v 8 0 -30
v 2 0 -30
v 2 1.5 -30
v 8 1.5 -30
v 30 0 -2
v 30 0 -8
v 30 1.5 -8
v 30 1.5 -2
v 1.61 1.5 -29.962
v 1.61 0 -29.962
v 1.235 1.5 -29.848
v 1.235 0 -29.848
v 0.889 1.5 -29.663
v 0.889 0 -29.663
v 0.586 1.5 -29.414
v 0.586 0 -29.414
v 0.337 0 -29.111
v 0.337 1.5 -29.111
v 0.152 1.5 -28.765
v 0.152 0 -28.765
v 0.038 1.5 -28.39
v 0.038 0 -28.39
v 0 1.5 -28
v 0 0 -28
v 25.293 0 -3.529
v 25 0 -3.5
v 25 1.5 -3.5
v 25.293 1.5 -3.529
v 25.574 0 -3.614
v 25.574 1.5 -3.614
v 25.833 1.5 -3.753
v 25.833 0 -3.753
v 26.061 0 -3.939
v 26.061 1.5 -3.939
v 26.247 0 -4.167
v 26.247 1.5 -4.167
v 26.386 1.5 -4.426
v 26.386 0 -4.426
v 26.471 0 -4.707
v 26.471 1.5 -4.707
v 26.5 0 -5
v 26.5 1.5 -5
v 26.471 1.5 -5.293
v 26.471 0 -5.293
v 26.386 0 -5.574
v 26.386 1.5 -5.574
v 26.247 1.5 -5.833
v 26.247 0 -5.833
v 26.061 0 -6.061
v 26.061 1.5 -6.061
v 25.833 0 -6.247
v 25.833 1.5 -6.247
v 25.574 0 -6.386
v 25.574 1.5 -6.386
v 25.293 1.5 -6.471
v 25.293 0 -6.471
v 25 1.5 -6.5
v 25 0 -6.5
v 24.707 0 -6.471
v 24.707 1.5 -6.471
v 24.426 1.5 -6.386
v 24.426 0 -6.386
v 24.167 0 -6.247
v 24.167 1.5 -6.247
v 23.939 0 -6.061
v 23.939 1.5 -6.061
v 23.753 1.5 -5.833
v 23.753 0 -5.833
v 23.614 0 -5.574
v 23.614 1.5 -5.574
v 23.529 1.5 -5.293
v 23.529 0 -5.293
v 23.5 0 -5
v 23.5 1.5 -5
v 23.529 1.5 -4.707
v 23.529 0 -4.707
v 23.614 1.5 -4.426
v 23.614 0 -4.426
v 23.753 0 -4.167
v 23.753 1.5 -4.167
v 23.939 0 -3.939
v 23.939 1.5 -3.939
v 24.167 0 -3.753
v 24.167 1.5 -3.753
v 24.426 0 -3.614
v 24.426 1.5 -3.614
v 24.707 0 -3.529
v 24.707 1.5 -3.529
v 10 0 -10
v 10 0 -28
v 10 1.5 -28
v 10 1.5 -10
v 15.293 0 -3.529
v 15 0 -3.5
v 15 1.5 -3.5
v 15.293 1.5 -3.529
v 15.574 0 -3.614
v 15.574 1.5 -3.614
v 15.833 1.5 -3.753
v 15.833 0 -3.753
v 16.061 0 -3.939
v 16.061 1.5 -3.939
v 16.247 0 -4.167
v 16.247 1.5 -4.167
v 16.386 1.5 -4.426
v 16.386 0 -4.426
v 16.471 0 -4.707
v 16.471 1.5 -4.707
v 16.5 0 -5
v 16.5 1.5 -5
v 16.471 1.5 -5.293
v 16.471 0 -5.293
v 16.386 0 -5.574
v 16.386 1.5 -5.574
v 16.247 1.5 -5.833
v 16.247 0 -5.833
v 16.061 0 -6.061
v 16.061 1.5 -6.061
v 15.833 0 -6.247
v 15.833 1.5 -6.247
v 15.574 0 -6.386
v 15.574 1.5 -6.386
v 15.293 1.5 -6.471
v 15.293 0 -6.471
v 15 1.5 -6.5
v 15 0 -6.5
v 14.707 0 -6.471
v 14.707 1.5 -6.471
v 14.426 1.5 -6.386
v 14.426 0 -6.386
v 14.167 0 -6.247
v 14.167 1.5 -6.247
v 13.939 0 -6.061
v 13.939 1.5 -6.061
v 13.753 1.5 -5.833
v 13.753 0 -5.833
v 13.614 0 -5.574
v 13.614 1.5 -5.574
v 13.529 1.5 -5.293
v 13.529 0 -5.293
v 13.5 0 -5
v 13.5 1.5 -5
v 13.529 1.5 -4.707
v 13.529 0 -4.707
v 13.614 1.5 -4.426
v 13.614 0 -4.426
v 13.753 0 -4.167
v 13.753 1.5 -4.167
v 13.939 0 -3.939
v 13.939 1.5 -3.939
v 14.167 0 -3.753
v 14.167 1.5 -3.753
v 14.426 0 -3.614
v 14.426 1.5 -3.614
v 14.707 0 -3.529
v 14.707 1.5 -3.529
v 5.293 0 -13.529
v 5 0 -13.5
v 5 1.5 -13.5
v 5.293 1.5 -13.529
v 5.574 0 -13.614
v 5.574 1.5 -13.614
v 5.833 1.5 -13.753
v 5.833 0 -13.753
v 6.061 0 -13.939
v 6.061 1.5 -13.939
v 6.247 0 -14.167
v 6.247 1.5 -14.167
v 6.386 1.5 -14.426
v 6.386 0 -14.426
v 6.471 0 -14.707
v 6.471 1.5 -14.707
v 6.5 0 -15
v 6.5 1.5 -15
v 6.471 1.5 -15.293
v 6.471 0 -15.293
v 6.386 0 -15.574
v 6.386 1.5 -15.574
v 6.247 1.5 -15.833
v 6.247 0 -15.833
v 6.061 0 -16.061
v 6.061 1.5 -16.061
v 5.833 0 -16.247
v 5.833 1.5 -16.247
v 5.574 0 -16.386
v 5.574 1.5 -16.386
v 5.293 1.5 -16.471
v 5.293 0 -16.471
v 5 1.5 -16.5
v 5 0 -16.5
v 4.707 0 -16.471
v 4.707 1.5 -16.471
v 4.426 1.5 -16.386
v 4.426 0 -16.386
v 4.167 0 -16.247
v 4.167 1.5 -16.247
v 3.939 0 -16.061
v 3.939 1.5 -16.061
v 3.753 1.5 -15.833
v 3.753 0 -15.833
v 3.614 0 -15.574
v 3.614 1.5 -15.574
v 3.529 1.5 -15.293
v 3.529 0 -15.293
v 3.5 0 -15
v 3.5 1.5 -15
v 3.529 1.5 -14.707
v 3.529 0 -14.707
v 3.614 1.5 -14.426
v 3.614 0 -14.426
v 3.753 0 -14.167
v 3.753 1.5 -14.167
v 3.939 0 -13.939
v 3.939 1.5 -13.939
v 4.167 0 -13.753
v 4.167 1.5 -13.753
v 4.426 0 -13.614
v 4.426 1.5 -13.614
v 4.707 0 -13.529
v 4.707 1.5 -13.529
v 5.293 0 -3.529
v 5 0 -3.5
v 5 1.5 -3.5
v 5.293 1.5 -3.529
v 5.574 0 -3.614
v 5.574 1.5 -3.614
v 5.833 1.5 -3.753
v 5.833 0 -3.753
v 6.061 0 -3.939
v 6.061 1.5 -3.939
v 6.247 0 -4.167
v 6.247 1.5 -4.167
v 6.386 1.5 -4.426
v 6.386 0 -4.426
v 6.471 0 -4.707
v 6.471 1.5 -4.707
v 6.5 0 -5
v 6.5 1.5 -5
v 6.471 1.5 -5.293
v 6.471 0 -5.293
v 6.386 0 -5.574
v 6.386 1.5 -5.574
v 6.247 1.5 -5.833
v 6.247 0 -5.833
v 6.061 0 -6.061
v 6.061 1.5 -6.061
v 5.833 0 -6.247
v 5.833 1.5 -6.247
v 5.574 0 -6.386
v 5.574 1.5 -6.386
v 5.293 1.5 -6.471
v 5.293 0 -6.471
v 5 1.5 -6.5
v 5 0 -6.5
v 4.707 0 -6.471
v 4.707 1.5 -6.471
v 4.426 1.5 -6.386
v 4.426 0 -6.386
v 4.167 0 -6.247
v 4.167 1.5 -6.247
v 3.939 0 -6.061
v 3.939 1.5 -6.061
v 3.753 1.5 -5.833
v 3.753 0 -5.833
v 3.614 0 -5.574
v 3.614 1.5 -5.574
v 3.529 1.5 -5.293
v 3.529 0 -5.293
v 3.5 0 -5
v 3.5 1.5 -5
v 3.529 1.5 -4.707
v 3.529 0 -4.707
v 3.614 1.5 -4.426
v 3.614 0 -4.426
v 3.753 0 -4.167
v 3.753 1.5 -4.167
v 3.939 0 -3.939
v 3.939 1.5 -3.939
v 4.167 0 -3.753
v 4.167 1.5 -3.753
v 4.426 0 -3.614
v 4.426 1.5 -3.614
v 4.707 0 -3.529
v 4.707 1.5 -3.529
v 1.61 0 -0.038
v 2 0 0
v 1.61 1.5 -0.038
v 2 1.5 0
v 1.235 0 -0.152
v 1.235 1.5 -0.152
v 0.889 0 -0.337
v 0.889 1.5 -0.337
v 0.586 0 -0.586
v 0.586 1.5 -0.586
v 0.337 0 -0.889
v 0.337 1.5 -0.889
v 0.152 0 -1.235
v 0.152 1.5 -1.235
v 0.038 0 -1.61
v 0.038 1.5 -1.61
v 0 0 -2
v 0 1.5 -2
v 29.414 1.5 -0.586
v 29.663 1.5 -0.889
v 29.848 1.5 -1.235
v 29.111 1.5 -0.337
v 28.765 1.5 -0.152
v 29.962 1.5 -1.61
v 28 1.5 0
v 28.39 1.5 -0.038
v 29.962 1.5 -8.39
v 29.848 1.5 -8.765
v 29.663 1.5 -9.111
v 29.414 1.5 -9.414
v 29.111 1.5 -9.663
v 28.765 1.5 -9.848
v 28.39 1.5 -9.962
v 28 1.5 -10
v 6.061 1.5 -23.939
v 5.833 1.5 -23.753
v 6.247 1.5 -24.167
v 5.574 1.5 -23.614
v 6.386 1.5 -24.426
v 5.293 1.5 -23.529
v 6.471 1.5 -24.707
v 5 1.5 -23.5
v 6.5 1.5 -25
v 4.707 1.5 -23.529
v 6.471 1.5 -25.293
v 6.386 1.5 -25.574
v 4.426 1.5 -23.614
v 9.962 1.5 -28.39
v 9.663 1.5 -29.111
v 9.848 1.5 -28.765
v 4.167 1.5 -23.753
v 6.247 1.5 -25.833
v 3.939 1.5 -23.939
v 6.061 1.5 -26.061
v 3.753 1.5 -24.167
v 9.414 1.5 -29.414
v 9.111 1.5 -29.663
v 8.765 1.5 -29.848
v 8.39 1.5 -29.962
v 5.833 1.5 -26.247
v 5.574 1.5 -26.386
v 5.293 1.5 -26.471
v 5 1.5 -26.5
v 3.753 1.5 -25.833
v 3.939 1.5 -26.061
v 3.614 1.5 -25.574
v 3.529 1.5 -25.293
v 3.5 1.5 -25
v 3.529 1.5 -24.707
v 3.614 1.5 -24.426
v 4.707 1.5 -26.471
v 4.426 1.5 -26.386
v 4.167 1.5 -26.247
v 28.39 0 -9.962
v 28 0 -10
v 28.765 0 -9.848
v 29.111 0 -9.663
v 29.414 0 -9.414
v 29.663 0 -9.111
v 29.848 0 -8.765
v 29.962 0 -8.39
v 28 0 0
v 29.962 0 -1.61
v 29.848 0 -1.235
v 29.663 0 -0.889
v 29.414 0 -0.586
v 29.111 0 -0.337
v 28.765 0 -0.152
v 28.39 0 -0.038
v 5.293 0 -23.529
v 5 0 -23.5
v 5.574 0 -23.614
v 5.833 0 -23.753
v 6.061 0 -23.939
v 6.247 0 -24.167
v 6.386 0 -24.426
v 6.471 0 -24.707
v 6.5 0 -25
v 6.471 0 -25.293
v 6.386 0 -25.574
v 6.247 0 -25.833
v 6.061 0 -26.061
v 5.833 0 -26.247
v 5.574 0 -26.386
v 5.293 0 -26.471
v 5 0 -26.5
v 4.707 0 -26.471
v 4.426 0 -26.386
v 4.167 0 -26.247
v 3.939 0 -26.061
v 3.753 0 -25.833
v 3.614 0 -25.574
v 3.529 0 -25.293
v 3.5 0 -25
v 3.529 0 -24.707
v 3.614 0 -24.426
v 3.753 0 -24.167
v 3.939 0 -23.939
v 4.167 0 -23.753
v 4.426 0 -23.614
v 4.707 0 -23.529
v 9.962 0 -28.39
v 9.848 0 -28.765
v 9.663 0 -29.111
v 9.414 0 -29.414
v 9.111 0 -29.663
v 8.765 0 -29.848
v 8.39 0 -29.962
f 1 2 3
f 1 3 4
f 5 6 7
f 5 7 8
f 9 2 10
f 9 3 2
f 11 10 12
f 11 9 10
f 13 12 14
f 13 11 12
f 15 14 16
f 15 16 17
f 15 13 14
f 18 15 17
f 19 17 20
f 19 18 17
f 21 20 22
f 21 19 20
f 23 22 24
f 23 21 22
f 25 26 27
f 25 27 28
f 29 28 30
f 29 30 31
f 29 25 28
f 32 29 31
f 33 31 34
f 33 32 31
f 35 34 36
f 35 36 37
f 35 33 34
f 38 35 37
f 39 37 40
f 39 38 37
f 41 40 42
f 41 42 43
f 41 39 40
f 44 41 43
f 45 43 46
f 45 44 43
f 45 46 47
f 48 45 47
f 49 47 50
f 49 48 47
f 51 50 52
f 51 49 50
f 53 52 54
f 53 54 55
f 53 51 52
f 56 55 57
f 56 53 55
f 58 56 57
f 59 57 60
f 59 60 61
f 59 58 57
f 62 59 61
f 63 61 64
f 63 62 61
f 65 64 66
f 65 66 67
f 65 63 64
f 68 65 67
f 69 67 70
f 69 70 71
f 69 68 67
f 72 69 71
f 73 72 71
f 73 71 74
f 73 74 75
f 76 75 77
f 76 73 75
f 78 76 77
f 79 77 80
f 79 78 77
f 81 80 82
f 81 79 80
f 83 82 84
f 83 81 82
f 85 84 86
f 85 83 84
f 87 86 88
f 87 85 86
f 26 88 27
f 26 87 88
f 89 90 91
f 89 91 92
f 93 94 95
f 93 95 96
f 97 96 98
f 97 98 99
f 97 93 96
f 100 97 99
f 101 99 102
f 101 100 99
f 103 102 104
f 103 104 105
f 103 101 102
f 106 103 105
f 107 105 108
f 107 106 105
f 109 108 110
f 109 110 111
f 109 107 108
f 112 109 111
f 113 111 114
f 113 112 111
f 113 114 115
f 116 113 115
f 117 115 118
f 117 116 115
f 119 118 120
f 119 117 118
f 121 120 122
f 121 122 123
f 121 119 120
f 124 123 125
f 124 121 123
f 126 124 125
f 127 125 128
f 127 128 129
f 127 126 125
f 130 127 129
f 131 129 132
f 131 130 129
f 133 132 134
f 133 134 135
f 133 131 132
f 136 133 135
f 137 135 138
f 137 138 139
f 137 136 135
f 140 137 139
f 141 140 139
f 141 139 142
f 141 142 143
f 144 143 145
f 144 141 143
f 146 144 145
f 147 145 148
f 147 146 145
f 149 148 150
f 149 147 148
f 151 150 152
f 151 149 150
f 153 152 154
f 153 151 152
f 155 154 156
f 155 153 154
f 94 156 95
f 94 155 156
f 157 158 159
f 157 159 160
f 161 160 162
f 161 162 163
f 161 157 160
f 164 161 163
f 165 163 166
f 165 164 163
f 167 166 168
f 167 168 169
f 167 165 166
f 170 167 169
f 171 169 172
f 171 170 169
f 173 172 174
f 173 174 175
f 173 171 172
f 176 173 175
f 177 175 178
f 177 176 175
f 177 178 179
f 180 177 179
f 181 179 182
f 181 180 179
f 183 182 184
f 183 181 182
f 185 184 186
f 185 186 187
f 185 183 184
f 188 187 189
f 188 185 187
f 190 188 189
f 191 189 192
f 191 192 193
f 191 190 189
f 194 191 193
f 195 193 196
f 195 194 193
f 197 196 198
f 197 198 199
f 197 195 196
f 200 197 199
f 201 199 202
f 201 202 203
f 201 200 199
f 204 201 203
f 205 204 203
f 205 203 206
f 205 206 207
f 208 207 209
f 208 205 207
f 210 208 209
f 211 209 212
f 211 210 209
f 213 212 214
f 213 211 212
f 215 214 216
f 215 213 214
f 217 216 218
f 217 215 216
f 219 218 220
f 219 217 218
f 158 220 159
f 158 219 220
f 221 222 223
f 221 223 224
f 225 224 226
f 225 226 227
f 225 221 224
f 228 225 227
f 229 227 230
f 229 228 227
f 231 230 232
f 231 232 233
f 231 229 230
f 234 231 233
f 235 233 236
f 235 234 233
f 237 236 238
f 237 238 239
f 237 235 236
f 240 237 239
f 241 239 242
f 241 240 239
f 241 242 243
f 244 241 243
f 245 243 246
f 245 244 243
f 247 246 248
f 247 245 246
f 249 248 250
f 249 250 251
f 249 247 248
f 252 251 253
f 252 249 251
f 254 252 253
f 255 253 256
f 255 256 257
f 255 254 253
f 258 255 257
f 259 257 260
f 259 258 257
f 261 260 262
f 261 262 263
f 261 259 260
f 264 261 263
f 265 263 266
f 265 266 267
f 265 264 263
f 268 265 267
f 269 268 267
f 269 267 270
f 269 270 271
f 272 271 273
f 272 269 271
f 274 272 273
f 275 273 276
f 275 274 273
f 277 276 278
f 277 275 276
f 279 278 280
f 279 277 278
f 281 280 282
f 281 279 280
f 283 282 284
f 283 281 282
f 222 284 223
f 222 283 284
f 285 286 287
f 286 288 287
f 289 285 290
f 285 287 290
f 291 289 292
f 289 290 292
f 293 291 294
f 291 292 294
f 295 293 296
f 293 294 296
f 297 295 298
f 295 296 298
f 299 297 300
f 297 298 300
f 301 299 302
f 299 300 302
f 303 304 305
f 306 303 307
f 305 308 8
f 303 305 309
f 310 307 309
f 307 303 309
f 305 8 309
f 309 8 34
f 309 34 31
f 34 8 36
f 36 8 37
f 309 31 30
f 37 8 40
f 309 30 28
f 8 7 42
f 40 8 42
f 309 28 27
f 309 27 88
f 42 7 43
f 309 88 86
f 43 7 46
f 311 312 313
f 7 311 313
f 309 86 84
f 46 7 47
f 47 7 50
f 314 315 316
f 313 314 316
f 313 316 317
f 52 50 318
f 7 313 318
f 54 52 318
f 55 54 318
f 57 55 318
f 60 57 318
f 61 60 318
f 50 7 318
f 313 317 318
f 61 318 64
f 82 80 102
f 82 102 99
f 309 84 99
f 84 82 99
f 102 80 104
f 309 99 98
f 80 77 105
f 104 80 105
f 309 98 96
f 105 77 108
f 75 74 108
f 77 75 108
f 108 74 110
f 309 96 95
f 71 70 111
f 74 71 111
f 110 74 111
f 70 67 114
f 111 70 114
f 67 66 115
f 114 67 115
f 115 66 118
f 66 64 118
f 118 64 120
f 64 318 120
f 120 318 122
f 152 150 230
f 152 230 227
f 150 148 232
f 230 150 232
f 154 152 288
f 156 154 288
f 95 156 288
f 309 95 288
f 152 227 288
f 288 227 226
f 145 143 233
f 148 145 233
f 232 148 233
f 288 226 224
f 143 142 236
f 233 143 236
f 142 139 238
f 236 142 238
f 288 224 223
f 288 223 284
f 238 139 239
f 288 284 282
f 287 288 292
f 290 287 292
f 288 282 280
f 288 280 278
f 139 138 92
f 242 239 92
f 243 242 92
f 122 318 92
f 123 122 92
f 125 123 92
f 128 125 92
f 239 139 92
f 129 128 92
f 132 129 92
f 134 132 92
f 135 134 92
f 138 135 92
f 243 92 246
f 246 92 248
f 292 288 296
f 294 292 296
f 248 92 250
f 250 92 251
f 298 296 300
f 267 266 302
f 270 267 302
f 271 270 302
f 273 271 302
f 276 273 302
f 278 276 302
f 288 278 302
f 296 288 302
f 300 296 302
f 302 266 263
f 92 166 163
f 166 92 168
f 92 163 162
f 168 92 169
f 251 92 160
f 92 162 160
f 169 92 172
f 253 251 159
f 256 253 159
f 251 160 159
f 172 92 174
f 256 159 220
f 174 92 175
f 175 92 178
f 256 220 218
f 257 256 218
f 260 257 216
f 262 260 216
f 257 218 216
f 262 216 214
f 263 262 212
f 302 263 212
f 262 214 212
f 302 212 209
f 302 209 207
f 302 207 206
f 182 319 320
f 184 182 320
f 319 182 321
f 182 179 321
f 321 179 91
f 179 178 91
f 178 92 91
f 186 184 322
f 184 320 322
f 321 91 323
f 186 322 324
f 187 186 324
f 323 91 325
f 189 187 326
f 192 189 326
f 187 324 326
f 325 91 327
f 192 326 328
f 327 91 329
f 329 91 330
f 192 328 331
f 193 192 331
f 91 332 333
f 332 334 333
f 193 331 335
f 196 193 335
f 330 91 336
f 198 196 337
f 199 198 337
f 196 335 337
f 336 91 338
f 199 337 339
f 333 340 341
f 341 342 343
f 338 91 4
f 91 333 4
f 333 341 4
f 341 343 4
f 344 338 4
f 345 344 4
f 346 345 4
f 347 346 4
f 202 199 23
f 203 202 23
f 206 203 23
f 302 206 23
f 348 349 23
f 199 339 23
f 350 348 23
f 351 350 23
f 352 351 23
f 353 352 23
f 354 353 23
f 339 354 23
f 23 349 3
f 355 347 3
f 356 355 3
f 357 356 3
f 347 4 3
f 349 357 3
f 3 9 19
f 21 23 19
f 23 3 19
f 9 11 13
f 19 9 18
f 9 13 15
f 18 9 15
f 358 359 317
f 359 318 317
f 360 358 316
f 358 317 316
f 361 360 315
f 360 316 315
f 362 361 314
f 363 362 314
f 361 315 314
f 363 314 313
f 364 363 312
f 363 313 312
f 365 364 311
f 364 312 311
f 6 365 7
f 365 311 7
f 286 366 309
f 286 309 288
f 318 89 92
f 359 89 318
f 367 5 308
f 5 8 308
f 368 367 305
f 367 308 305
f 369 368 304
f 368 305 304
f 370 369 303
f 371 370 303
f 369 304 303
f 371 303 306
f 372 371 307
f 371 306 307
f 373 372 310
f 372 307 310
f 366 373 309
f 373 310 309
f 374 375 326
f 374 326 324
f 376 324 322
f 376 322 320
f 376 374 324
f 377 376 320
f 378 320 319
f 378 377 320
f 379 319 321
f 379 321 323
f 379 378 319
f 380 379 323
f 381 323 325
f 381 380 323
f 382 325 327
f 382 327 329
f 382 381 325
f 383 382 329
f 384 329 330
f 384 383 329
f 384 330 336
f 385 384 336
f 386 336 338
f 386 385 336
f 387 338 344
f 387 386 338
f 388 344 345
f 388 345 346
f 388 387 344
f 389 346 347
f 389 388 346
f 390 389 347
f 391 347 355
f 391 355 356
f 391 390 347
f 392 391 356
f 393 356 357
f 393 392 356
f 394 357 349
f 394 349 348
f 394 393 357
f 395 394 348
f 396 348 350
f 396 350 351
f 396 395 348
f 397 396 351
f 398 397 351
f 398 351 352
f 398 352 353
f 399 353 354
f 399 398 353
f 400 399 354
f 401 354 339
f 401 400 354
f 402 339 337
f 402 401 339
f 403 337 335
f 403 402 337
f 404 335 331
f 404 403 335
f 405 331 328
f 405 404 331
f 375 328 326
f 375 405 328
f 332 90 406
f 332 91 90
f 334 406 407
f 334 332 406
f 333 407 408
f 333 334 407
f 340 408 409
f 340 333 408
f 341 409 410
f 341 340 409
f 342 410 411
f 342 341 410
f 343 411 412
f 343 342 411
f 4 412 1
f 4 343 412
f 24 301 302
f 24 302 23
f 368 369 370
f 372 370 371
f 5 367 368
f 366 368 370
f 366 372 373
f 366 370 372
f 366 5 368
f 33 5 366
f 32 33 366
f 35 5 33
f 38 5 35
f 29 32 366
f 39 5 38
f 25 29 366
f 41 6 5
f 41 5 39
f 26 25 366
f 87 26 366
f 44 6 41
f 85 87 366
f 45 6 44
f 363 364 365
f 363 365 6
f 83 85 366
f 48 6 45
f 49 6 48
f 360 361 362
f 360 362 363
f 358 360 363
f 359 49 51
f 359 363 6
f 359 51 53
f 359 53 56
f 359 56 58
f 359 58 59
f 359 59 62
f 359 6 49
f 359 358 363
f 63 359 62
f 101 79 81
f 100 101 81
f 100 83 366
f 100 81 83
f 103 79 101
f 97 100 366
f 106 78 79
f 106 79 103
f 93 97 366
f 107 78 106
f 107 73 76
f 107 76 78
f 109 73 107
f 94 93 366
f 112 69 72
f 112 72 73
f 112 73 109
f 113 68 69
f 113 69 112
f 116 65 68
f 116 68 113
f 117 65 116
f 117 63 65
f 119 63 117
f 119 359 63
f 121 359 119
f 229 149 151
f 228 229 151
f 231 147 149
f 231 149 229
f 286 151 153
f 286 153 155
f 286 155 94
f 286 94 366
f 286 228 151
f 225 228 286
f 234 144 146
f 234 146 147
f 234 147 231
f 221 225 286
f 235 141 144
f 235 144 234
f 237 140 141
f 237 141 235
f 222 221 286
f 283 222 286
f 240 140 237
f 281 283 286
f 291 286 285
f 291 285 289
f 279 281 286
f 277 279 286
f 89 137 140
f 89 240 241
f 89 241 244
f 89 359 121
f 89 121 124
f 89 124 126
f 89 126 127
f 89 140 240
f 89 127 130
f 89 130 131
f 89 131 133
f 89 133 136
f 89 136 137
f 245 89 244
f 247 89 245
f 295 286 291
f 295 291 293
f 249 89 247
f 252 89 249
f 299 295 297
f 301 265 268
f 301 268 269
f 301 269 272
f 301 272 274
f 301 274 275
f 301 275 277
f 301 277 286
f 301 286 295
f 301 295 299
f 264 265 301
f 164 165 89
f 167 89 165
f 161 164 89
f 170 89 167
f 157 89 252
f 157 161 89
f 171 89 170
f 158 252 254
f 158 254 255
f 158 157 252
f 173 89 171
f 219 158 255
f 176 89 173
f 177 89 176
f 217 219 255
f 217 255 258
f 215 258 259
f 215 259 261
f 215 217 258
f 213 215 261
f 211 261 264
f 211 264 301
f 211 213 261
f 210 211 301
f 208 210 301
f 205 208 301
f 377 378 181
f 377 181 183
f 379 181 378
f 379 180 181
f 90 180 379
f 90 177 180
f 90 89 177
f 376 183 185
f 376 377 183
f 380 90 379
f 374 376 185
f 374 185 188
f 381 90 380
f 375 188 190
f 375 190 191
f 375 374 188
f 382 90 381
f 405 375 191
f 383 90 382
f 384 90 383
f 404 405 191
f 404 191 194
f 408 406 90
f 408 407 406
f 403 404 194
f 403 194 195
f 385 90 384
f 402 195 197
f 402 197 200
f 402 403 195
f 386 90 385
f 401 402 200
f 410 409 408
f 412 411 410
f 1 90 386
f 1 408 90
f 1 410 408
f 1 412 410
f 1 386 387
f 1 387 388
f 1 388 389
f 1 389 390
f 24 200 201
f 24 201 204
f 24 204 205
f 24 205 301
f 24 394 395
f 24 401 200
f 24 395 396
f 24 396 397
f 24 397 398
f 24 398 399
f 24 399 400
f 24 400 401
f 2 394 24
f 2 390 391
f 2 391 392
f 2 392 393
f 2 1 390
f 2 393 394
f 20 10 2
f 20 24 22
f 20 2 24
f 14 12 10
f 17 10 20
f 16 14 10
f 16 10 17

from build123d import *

# Parameters (mm, degrees)
SKETCH_2_R      = 1.5
EXTRUDE_1_DEPTH = 1.5
FILLET_1_R      = 2


with BuildPart() as part:
    # ｽｹｯﾁ2 → ﾎﾞｽ - 押し出し1 (new body)
    with BuildSketch(Plane(origin=(0, 0, 0), x_dir=(1, 0, 0), z_dir=(0, 1, 0))):
        Polygon((10, 10), (30, 10), (30, 0), (0, 0), (0, 30), (10, 30), align=None)
        with Locations(Location((5, 25, 0), (0, 0, 270))):
            Circle(SKETCH_2_R, mode=Mode.SUBTRACT)
        with Locations(Location((25, 5, 0), (0, 0, 270))):
            Circle(SKETCH_2_R, mode=Mode.SUBTRACT)
        with Locations(Location((5, 5, 0), (0, 0, 270))):
            Circle(SKETCH_2_R, mode=Mode.SUBTRACT)
        with Locations(Location((15, 5, 0), (0, 0, 270))):
            Circle(SKETCH_2_R, mode=Mode.SUBTRACT)
        with Locations(Location((5, 15, 0), (0, 0, 270))):
            Circle(SKETCH_2_R, mode=Mode.SUBTRACT)
    extrude(amount=EXTRUDE_1_DEPTH)

    # ﾌｨﾚｯﾄ1
    fillet_1_edges = [part.edges().sort_by_distance(p)[0] for p in [
        (30, 0.75, -10),
        (30, 0.75, 0),
        (0, 0.75, 0),
        (0, 0.75, -30),
        (10, 0.75, -30),
    ]]
    fillet(fillet_1_edges, radius=FILLET_1_R)


solid = part.part
